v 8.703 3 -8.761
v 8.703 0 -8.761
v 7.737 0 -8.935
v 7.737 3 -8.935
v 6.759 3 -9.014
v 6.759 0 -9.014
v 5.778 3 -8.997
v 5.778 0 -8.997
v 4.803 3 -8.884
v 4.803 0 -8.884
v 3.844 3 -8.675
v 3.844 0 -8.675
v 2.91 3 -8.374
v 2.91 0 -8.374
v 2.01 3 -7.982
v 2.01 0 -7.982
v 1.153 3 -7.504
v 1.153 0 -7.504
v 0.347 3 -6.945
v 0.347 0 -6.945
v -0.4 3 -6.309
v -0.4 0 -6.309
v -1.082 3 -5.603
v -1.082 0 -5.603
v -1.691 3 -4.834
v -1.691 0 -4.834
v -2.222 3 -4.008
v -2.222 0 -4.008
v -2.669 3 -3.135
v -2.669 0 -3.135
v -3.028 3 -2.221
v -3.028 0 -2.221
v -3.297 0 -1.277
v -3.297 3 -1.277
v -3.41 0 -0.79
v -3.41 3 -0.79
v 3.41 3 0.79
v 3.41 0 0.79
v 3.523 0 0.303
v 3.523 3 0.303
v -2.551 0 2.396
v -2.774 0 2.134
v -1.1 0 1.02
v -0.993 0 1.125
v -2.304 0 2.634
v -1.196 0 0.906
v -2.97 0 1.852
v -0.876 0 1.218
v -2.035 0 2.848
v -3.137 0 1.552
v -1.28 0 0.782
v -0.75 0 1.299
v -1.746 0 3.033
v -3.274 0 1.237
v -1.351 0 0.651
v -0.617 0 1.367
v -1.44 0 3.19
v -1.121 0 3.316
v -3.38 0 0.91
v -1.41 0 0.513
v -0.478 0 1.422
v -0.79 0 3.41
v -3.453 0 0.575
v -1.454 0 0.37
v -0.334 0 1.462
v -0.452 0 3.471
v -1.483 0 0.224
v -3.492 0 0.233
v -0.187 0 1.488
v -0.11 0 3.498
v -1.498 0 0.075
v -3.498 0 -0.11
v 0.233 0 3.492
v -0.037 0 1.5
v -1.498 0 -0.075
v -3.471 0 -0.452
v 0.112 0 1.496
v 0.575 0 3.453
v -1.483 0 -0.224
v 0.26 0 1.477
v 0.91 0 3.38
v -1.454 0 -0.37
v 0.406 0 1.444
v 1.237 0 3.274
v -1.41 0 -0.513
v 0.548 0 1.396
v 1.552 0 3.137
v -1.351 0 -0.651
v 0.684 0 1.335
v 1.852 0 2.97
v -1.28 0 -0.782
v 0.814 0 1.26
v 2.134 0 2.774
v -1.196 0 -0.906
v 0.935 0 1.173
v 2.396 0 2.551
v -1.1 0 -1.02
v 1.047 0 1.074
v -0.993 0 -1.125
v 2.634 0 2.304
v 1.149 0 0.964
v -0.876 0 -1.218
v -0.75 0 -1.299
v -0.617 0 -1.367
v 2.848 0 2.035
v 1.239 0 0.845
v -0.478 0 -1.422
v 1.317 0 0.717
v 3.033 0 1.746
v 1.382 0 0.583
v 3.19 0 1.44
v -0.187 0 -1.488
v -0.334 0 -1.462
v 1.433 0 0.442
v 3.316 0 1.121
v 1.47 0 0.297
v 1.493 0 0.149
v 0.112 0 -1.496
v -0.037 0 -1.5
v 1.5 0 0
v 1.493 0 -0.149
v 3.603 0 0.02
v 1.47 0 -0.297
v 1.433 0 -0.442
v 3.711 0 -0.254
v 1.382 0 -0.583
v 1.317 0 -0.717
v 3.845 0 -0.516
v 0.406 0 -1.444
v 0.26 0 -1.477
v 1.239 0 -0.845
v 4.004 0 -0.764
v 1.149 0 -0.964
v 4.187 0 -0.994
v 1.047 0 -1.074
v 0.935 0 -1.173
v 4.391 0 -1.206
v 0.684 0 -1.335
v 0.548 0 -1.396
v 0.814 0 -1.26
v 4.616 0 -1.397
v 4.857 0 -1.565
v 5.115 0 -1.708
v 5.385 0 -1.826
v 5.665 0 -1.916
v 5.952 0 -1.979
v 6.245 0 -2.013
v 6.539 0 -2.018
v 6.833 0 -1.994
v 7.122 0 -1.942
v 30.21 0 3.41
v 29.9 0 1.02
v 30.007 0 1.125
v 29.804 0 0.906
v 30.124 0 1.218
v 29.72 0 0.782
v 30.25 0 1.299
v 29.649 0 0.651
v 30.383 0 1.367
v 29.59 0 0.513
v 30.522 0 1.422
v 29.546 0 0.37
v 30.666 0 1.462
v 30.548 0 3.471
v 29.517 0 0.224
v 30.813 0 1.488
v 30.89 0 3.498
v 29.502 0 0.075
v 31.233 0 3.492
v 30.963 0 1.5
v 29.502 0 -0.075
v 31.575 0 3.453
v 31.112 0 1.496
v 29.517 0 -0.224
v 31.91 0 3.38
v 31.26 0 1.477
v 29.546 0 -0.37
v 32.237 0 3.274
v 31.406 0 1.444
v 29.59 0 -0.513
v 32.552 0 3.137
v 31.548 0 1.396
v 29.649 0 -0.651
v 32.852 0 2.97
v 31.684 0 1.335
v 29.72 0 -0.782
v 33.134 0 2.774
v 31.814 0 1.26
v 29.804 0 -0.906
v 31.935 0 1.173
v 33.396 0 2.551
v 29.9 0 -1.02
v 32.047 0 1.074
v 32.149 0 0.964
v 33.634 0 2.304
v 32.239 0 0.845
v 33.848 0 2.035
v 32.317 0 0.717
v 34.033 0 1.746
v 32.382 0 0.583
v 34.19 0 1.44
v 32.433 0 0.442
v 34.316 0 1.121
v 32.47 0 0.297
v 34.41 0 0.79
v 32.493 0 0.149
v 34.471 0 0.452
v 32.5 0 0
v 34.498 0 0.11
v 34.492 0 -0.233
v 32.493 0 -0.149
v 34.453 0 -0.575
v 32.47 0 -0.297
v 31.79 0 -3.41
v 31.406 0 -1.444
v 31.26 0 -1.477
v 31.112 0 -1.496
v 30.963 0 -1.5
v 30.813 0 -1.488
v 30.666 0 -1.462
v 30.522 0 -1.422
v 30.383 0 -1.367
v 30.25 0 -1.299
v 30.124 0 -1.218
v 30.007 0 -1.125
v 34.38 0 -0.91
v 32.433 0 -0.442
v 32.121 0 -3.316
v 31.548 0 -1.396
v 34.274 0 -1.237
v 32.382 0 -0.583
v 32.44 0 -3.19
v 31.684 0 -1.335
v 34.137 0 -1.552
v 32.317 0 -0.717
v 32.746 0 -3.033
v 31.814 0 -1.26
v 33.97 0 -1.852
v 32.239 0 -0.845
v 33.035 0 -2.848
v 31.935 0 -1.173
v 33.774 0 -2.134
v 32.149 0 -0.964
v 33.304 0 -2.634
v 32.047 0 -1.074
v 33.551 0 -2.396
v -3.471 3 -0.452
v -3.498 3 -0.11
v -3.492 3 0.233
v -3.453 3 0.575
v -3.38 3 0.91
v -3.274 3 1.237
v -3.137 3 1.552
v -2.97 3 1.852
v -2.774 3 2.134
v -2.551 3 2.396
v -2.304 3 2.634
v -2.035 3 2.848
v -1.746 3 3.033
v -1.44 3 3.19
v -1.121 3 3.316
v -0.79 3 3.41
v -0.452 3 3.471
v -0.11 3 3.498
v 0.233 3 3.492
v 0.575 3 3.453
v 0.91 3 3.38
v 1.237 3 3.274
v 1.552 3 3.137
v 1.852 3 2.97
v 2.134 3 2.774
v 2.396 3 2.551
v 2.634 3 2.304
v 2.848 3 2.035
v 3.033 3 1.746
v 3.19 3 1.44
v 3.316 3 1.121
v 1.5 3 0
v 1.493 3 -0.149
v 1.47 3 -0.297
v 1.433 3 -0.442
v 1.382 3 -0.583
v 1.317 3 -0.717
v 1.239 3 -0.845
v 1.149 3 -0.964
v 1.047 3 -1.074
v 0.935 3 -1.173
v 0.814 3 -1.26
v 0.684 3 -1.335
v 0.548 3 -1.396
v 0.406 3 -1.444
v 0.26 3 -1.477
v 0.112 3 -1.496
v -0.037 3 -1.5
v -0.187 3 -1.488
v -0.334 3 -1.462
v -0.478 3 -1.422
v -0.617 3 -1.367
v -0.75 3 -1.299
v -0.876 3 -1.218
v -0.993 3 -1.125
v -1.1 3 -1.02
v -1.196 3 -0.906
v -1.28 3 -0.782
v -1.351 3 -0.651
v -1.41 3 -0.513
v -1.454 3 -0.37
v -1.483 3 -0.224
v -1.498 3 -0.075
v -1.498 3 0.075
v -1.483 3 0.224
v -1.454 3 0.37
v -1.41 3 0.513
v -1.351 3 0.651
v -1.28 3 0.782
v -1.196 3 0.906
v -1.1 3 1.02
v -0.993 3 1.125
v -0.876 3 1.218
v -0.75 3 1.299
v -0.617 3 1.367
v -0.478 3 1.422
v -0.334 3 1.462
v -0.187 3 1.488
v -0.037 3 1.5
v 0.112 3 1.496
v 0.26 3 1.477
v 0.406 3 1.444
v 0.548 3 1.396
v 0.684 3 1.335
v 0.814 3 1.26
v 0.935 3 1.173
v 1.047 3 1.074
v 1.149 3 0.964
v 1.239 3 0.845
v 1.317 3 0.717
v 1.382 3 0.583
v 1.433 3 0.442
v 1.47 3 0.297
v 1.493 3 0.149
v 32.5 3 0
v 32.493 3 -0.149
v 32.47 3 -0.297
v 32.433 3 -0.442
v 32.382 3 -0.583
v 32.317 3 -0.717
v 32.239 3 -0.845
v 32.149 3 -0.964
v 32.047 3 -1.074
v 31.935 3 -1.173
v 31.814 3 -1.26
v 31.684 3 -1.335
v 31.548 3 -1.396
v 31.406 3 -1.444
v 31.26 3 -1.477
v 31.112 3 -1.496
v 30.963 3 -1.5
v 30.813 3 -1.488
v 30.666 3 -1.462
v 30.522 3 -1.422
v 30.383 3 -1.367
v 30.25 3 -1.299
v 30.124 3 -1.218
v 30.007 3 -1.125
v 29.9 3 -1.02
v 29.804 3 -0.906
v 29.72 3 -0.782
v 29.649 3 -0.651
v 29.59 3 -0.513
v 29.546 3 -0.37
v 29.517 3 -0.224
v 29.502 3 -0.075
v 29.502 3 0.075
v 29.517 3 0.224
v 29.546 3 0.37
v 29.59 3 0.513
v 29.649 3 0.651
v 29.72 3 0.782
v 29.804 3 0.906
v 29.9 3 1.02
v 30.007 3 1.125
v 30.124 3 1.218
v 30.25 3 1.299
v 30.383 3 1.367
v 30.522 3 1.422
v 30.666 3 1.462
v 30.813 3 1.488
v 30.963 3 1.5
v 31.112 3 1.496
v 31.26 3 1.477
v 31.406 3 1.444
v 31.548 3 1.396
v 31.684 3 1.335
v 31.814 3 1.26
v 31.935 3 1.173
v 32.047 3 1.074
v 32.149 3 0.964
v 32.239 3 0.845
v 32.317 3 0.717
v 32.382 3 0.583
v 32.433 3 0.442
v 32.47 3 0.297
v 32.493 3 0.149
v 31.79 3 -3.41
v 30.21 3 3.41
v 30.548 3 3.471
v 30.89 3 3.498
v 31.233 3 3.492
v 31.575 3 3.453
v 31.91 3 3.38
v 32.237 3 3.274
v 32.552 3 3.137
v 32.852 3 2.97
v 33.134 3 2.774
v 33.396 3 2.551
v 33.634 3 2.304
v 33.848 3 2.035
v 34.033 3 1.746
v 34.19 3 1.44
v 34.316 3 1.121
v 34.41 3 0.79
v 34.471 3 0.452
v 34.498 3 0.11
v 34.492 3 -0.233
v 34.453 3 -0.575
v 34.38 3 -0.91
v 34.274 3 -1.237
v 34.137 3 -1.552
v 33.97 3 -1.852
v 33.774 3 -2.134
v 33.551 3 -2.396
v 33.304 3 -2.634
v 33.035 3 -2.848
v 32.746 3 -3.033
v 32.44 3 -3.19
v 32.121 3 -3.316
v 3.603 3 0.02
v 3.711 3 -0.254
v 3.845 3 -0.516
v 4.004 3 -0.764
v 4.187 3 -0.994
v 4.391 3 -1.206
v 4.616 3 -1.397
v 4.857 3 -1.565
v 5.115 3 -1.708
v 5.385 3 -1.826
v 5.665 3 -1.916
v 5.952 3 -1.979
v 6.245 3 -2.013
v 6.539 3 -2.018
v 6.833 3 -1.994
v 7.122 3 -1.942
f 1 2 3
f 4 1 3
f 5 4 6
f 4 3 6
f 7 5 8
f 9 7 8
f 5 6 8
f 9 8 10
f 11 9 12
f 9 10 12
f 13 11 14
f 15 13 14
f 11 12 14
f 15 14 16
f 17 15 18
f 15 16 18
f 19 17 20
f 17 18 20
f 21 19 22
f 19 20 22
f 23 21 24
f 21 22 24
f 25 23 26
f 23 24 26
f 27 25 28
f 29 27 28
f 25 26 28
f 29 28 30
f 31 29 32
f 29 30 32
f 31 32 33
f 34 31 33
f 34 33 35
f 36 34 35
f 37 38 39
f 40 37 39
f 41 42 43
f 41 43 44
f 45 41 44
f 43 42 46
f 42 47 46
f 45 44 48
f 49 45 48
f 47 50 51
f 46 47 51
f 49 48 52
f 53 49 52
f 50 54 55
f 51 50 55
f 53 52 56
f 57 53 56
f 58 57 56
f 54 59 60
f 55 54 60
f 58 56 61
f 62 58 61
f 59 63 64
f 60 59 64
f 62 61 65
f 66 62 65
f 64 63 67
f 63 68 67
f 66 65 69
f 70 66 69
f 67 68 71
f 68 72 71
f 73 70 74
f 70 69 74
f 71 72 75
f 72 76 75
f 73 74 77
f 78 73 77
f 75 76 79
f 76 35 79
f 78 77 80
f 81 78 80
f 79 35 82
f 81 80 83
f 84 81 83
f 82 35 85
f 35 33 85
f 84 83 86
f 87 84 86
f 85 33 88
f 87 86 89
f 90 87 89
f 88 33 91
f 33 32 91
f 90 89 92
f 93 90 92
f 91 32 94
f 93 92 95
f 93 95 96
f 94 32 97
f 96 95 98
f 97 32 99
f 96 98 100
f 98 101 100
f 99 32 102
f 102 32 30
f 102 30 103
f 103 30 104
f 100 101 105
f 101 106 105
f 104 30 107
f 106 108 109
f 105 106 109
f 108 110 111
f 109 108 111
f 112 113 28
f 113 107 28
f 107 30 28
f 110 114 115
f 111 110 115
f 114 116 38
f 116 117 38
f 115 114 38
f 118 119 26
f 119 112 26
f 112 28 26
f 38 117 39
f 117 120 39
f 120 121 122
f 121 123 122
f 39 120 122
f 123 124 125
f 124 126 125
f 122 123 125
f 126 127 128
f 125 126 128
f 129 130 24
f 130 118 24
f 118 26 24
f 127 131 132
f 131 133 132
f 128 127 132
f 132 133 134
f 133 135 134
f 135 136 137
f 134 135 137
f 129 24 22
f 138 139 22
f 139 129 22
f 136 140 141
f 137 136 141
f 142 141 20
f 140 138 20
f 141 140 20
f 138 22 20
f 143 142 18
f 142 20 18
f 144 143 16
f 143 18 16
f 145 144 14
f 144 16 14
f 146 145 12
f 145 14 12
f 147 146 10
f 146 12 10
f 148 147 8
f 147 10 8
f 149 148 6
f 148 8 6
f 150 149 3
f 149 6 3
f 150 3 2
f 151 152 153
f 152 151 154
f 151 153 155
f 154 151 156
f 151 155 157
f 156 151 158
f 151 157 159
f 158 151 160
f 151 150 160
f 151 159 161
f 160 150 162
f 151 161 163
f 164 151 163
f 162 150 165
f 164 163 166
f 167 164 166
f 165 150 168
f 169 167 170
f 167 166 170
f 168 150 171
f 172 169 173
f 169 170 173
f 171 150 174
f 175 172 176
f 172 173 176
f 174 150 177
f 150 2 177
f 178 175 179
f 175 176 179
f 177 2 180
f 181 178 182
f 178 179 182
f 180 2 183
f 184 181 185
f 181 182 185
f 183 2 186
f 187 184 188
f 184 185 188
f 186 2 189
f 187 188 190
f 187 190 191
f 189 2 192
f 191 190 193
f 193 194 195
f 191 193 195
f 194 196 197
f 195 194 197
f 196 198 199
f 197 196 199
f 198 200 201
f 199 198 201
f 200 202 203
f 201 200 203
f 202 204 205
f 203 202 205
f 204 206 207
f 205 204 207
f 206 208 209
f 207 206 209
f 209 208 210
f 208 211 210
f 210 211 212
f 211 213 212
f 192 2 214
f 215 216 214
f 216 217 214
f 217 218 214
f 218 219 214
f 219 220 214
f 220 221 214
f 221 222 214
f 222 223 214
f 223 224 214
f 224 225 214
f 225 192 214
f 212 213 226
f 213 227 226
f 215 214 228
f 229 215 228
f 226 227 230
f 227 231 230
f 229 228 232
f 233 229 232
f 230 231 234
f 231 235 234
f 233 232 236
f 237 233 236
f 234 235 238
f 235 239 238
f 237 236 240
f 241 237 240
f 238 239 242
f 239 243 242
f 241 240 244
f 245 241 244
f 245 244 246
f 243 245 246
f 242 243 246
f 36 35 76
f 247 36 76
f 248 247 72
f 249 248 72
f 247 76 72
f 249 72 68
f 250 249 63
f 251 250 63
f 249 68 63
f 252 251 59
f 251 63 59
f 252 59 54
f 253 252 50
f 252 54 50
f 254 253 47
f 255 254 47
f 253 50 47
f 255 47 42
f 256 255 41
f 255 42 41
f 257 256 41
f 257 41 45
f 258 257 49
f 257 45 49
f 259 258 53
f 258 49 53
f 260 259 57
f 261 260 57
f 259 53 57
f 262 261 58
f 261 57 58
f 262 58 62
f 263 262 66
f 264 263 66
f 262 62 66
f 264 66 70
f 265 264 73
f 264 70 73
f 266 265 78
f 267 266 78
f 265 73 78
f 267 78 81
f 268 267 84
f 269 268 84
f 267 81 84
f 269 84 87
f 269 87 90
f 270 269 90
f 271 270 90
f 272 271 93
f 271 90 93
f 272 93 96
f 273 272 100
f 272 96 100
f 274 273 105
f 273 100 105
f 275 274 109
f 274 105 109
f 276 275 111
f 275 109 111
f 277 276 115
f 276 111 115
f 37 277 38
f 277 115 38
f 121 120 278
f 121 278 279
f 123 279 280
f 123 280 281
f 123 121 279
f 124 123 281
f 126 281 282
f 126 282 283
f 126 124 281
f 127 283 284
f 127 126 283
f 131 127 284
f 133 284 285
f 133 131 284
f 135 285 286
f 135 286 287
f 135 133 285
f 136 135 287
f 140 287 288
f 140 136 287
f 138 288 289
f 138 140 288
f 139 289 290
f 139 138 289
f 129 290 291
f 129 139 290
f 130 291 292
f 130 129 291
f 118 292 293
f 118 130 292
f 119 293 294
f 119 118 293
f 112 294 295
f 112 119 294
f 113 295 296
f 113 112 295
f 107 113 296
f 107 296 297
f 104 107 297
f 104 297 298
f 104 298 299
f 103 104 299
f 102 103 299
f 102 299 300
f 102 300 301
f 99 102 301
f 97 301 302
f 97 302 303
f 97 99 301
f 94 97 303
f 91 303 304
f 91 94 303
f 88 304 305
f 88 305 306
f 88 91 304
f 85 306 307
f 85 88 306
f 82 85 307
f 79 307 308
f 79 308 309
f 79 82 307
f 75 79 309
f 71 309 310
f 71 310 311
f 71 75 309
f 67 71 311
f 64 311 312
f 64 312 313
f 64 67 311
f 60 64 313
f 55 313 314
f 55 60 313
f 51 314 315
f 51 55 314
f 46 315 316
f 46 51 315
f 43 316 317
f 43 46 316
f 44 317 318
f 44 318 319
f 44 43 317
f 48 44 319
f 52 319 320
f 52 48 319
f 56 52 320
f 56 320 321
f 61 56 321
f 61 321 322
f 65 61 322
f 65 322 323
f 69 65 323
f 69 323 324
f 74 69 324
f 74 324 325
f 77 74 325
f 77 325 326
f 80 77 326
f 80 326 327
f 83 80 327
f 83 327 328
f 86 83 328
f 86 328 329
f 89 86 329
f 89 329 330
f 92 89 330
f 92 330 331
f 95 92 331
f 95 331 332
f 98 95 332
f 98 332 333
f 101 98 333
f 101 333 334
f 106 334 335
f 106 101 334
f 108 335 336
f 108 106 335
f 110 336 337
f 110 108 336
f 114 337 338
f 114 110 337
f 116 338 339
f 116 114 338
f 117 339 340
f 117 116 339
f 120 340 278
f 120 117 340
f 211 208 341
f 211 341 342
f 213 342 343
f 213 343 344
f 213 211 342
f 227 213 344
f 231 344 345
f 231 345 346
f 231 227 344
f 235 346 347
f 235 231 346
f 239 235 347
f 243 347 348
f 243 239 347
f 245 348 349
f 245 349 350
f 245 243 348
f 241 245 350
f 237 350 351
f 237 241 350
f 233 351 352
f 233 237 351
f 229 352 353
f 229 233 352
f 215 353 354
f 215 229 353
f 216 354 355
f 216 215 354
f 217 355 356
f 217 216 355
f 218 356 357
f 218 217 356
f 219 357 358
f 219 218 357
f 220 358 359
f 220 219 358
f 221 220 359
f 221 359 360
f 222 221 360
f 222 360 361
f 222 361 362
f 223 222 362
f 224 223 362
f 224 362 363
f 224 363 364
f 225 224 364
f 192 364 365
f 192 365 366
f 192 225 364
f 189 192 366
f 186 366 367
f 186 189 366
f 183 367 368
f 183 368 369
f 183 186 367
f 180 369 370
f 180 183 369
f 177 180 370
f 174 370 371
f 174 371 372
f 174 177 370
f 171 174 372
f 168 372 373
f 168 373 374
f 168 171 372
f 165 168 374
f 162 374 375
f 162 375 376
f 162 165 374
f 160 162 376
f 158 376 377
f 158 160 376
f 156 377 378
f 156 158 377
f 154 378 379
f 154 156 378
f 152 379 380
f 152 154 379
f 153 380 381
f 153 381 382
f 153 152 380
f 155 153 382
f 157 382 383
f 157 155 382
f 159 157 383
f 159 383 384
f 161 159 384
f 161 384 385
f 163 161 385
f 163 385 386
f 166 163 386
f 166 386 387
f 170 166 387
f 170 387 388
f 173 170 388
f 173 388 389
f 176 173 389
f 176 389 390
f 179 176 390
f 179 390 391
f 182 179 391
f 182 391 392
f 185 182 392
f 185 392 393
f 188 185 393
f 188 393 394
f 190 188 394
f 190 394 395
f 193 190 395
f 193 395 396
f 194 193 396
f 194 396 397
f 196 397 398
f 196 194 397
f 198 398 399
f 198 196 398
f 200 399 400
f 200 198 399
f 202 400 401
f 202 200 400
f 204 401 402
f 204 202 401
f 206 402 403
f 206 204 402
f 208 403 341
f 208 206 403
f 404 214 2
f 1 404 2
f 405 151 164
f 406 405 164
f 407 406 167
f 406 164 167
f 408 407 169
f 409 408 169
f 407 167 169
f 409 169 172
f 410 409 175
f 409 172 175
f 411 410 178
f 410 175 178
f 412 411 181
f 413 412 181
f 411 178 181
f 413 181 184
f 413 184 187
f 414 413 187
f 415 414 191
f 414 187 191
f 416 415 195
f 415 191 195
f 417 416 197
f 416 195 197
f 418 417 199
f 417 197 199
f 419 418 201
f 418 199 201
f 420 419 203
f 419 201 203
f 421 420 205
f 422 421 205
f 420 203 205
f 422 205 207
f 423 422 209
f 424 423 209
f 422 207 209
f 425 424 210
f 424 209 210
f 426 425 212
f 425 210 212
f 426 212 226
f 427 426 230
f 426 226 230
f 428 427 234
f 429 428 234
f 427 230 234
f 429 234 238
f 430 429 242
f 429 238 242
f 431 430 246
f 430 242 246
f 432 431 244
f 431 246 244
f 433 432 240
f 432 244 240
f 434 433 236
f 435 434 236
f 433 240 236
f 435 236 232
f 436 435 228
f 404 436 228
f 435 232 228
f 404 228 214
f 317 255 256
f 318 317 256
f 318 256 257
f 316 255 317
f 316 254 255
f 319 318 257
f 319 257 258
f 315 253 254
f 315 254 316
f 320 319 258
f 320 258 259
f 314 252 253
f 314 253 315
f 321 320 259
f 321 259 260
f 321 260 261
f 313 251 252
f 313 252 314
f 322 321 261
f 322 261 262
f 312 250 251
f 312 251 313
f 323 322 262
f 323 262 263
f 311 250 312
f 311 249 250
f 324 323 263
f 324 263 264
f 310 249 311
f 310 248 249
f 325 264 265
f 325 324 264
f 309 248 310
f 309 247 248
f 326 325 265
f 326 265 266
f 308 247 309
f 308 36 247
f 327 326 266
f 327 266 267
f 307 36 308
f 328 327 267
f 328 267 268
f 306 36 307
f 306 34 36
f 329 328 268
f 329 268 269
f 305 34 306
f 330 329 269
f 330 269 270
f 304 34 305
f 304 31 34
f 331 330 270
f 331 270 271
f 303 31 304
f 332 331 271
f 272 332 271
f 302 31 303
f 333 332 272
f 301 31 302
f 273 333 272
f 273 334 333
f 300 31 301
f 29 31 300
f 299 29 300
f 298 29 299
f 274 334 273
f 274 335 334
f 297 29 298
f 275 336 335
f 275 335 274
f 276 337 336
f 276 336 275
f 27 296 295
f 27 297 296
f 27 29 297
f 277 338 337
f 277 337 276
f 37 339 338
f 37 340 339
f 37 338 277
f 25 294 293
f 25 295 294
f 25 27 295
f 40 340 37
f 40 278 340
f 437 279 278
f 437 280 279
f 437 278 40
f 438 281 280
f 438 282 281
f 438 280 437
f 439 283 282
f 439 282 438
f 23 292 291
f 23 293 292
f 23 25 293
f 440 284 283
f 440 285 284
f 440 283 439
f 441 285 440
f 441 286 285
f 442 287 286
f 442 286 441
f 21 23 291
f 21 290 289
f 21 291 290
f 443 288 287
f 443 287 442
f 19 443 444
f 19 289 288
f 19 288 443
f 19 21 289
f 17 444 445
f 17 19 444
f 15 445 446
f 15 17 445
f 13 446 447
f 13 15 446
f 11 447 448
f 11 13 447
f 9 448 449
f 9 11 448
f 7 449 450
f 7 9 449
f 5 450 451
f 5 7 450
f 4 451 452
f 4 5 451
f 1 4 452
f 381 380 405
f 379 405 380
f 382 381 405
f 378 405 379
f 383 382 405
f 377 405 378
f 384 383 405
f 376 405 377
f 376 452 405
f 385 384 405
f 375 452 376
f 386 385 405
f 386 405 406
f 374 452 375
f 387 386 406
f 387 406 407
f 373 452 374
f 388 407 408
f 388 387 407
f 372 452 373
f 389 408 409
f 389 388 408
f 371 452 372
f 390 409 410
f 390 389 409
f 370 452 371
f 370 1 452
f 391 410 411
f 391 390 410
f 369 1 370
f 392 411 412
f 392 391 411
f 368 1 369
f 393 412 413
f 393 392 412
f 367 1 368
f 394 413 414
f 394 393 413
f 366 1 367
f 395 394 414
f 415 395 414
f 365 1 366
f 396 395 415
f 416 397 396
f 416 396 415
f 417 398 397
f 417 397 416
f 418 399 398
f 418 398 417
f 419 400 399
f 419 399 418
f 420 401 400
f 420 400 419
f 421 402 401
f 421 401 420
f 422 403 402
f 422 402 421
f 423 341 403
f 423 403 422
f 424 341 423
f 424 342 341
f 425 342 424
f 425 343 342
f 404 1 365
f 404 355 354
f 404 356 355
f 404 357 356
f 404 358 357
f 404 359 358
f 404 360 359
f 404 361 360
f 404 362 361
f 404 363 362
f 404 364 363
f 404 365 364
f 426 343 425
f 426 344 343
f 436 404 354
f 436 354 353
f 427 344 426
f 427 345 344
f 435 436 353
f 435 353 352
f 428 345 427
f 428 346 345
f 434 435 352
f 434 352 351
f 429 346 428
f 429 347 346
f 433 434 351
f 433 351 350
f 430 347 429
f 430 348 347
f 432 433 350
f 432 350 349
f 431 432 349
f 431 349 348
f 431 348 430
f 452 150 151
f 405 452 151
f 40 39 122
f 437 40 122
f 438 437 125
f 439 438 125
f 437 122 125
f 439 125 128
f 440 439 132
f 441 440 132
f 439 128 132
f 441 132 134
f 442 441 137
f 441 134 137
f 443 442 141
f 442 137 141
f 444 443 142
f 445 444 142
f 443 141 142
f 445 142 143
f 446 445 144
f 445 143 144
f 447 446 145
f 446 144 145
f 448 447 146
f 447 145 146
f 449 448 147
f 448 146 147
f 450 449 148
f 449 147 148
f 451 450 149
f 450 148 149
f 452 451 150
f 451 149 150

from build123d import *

# Parameters (mm, degrees)
SKETCH1_R           = 1.5
BOSS_EXTRUDE1_DEPTH = 3


with BuildPart() as part:
    # Sketch1 → Boss-Extrude1 (new body)
    with BuildSketch(Plane(origin=(0, 0, 0), x_dir=(1, 0, 0), z_dir=(0, 1, 0))):
        with BuildLine():
            Line((3.409602648, -0.790322581), (3.522505874, -0.303236488))
            ThreePointArc((3.522505874, -0.303236488), (4.857498975, 1.564883251), (7.122441784, 1.941860713))
            Line((7.122441784, 1.941860713), (30.209677419, -3.409602648))
            ThreePointArc((30.209677419, -3.409602648), (34.409602648, -0.790322581), (31.790322581, 3.409602648))
            Line((31.790322581, 3.409602648), (8.703086946, 8.761066009))
            ThreePointArc((8.703086946, 8.761066009), (1.153277579, 7.504474471), (-3.296699422, 1.277408673))
            Line((-3.296699422, 1.277408673), (-3.409602648, 0.790322581))
            ThreePointArc((-3.409602648, 0.790322581), (-0.790322581, -3.409602648), (3.409602648, -0.790322581))
        make_face()
        Circle(SKETCH1_R, mode=Mode.SUBTRACT)
        with Locations((31, 0)):
            Circle(SKETCH1_R, mode=Mode.SUBTRACT)
    extrude(amount=BOSS_EXTRUDE1_DEPTH)


solid = part.part
